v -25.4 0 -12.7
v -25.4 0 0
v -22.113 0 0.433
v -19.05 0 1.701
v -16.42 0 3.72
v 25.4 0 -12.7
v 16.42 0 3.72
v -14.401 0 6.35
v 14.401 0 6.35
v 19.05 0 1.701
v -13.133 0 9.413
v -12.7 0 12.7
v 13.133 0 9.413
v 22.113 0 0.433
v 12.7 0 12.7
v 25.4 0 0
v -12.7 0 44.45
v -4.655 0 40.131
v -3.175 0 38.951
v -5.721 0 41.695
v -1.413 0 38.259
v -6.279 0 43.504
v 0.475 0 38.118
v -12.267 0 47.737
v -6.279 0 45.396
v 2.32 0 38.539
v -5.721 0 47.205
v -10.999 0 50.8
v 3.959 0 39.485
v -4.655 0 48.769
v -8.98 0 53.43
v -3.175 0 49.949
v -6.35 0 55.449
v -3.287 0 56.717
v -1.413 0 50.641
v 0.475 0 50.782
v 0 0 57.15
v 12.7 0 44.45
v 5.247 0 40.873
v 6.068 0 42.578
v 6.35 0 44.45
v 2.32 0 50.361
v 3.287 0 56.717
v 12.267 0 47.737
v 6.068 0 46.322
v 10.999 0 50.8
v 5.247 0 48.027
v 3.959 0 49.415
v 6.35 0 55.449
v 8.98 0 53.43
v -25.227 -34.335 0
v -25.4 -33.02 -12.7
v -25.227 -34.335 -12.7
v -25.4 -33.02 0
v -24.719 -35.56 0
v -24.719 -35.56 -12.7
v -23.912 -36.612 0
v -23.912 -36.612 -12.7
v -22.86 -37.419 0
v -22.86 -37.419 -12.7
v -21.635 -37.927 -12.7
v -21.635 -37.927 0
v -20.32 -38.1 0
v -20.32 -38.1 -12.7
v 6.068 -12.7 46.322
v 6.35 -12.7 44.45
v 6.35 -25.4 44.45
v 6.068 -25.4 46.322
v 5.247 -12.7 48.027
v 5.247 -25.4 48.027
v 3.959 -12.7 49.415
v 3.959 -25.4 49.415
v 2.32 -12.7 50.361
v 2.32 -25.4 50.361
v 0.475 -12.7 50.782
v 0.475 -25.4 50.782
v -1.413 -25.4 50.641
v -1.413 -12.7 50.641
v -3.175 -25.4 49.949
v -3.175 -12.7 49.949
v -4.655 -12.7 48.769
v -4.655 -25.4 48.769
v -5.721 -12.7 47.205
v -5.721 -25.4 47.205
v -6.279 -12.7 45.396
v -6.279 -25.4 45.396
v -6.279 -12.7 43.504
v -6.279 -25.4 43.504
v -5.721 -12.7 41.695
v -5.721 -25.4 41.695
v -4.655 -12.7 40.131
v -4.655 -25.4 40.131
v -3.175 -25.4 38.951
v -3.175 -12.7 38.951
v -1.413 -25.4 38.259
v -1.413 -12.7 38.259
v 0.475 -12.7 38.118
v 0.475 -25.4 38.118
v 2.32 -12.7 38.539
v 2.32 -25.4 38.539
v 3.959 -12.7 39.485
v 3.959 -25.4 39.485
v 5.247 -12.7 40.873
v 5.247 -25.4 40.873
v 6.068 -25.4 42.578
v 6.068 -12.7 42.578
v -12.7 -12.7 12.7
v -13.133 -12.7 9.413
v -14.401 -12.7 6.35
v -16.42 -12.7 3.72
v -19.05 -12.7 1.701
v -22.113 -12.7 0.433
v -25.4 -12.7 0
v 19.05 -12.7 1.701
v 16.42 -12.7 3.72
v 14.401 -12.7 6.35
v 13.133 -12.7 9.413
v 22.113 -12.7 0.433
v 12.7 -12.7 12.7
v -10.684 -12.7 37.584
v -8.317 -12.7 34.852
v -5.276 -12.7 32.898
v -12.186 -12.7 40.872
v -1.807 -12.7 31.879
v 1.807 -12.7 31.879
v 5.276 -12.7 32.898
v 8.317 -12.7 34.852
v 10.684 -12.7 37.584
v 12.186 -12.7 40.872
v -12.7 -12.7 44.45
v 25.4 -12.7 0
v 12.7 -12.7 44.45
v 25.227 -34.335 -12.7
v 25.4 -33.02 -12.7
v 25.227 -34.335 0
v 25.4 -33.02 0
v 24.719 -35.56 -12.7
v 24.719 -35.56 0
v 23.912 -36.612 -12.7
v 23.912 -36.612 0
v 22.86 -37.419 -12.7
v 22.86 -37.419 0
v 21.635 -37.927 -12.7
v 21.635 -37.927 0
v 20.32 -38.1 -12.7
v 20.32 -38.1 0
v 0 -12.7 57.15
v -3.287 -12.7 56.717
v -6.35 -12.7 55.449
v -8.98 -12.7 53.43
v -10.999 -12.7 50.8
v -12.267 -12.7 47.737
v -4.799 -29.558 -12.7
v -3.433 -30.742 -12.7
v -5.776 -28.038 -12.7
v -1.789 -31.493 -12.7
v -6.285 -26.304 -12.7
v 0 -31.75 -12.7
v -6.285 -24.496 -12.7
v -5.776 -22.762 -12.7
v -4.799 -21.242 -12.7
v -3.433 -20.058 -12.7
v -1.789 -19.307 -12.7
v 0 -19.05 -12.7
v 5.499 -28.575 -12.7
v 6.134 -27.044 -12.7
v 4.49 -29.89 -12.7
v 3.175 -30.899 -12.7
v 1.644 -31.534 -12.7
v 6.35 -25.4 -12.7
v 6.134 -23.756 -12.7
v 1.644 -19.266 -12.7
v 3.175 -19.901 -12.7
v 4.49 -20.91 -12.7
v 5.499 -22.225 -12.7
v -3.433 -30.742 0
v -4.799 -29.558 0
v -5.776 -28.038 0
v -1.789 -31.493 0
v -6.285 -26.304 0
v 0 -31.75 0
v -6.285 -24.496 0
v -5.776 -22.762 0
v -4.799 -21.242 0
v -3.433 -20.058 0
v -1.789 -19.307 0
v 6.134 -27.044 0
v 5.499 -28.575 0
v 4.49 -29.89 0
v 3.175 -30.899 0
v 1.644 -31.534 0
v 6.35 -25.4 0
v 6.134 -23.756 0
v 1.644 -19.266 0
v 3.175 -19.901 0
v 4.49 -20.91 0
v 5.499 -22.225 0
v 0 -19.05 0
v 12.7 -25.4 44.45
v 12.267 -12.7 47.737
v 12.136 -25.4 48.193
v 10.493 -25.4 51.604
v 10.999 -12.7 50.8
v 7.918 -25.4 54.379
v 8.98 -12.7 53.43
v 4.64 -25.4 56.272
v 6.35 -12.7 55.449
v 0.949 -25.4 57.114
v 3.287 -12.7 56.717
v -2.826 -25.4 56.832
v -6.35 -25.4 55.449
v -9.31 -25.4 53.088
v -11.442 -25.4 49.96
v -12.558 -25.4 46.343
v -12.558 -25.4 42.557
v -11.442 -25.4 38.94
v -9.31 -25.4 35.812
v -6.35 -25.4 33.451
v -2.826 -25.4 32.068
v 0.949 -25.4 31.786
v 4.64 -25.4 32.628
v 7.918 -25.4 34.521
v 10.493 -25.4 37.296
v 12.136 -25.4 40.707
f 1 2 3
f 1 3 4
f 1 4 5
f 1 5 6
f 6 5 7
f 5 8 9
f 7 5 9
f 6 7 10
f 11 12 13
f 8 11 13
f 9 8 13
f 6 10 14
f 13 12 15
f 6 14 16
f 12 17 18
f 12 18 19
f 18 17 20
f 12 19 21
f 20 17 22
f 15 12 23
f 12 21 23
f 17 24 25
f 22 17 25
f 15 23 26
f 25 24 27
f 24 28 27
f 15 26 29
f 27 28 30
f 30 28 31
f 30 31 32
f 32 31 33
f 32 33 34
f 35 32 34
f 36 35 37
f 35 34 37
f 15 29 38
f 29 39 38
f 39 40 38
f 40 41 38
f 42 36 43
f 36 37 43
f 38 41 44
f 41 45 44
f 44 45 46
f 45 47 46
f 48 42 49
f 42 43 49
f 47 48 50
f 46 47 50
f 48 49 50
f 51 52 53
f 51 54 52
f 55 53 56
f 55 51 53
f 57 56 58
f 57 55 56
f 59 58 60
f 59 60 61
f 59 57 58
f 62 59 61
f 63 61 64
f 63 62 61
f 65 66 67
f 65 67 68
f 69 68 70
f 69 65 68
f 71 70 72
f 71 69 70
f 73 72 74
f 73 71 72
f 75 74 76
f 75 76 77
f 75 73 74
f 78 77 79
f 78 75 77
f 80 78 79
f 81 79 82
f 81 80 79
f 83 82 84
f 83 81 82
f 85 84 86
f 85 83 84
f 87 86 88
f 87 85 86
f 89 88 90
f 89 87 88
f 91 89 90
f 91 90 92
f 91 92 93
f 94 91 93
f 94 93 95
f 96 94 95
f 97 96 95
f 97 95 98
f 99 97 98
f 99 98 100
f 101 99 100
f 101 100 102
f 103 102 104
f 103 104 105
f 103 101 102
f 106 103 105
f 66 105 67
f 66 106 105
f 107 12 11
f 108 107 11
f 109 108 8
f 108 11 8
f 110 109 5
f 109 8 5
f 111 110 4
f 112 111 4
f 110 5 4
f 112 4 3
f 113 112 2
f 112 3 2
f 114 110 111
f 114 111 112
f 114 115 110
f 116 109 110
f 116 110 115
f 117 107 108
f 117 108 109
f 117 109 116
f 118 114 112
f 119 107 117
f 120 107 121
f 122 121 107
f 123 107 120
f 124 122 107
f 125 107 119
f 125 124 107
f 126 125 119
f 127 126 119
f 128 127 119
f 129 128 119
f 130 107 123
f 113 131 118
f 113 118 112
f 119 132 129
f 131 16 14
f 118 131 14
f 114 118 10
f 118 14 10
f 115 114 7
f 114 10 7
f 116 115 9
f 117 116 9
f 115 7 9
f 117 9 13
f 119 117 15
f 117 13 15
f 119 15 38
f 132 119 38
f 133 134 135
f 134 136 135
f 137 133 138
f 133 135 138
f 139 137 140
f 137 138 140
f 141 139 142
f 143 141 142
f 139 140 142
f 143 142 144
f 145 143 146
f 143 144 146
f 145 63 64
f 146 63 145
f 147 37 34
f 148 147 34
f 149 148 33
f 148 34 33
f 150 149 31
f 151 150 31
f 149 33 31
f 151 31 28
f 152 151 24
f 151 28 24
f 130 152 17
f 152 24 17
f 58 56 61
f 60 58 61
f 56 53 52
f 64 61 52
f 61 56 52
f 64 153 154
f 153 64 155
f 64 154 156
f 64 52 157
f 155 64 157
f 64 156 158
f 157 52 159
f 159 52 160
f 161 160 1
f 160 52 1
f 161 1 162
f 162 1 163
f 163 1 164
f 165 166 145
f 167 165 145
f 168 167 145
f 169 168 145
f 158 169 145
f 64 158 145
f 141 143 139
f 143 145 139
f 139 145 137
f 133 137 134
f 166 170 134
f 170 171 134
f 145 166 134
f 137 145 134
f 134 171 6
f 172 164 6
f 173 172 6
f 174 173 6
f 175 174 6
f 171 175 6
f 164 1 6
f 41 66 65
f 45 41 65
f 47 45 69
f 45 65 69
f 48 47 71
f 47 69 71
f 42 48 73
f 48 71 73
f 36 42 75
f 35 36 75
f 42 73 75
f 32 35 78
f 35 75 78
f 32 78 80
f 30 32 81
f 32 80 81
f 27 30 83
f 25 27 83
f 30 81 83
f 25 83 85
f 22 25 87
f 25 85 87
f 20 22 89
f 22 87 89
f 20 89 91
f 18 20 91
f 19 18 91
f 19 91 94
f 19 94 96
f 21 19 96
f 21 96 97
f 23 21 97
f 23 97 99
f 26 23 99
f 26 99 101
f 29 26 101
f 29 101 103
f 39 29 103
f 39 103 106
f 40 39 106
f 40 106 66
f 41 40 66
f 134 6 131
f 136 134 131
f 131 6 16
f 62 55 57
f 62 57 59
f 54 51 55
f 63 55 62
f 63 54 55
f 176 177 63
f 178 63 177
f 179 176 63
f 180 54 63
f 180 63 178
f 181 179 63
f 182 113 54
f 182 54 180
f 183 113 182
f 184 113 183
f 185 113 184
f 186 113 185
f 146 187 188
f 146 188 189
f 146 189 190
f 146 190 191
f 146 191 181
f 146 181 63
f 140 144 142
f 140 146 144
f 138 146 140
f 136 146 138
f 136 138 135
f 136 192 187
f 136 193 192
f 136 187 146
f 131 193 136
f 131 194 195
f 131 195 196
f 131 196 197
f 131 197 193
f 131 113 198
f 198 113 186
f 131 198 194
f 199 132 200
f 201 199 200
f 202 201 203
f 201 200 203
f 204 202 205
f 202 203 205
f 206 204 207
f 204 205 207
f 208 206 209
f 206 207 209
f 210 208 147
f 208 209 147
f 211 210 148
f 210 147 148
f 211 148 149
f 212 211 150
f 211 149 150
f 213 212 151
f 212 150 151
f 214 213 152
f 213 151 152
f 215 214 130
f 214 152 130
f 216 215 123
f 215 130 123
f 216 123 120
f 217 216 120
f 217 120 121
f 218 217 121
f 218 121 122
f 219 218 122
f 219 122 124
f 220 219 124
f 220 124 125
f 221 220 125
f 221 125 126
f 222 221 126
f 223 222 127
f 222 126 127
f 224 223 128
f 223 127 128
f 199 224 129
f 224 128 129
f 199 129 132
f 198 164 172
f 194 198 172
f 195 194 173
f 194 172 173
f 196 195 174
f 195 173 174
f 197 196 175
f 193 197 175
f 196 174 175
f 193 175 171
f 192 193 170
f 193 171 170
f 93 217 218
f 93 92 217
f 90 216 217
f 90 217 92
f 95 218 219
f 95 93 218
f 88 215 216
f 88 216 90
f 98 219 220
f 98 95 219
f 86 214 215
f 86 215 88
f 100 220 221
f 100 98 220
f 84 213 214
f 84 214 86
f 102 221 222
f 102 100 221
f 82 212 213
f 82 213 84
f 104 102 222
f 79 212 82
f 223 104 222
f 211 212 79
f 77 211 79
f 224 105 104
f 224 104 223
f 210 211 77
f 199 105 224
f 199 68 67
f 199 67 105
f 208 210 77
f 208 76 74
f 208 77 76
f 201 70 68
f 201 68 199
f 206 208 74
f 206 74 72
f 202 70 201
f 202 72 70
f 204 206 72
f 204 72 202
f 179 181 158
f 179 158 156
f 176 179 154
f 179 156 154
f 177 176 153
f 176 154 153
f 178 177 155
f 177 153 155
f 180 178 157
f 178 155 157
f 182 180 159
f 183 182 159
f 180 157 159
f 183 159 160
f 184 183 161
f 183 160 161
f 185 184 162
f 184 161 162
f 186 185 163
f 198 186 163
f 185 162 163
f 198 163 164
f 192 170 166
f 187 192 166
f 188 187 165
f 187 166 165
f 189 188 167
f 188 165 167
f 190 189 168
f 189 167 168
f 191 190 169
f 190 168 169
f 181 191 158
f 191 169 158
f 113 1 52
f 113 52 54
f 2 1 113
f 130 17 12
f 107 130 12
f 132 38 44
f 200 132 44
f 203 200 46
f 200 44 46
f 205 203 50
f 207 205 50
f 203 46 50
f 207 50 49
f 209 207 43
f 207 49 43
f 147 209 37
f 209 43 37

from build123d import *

# Parameters (mm, degrees)
F0_W      = 12.7
F0_H      = 12.7
F1_DEPTH  = 12.7
F3_DEPTH  = 25.4
F4_W      = 50.8
F4_H      = 12.7
F5_DEPTH  = 25.4
F6_R      = 5.08
F7_R      = 12.7
F7_R_2    = 6.35
F8_DEPTH  = 12.7
F9_DEPTH  = 25.4
F11_DEPTH = 25.4


with BuildPart() as f1:
    # F0 (on Front) → F1 (new body)
    with BuildSketch(Plane.XZ):
        with BuildLine():
            Line((0, 31.75), (0, 0))
            Line((0, 0), (12.7, 0))
            Line((12.7, 0), (12.7, 12.7))
            Line((12.7, 12.7), (12.7, 44.45))
            ThreePointArc((12.7, 44.45), (8.9802561211, 35.4697438789), (0, 31.75))
        make_face()
        Polygon((12.7, 0), (0, 0), (-12.7, 0), (-25.4, 0), (-25.4, -12.7), (0, -12.7), (25.4, -12.7), (25.4, 0), align=None)
        with BuildLine():
            Line((-12.7, 0), (0, 0))
            Line((0, 0), (0, 31.75))
            ThreePointArc((0, 31.75), (-8.9802561211, 35.4697438789), (-12.7, 44.45))
            Line((-12.7, 44.45), (-12.7, 12.7))
            Line((-12.7, 12.7), (-12.7, 0))
        make_face()
        with Locations((19.05, 6.35)):
            Rectangle(F0_W, F0_H)
        with Locations((-19.05, 6.35)):
            Rectangle(F0_W, F0_H)
        with BuildLine():
            ThreePointArc((-12.7, 44.45), (-8.9802561211, 35.4697438789), (0, 31.75))
            Line((0, 31.75), (0, 44.45))
            Line((0, 44.45), (-12.7, 44.45))
        make_face()
        with BuildLine():
            Line((0, 44.45), (0, 31.75))
            ThreePointArc((0, 31.75), (8.9802561211, 35.4697438789), (12.7, 44.45))
            Line((12.7, 44.45), (0, 44.45))
        make_face()
        with BuildLine():
            Line((-12.7, 44.45), (0, 44.45))
            Line((0, 44.45), (0, 57.15))
            ThreePointArc((0, 57.15), (-8.9802561211, 53.4302561211), (-12.7, 44.45))
        make_face()
        with BuildLine():
            Line((0, 57.15), (0, 44.45))
            Line((0, 44.45), (12.7, 44.45))
            ThreePointArc((12.7, 44.45), (8.9802561211, 53.4302561211), (0, 57.15))
        make_face()
    extrude(amount=F1_DEPTH)

    # F2 (on face) → F3 (cut)
    with BuildSketch(Plane(origin=(0, 0, 0), x_dir=(-1, 0, 0), z_dir=(0, 1, 0))):
        with BuildLine():
            Line((25.4, 12.7), (12.7, 12.7))
            ThreePointArc((12.7, 12.7), (16.4197438789, 3.7197438789), (25.4, 0))
            Line((25.4, 0), (25.4, 12.7))
        make_face()
        with BuildLine():
            ThreePointArc((-25.4, 0), (-16.4197438789, 3.7197438789), (-12.7, 12.7))
            Line((-12.7, 12.7), (-25.4, 12.7))
            Line((-25.4, 12.7), (-25.4, 0))
        make_face()
    extrude(amount=-F3_DEPTH, mode=Mode.SUBTRACT)

    # F4 (on face) → F5 (join)
    with BuildSketch(Plane.XZ.offset(12.7)):
        with Locations((0, -6.35)):
            Rectangle(F4_W, F4_H)
    extrude(amount=F5_DEPTH)

    # F6
    f6_edges = [f1.edges().sort_by_distance(p)[0] for p in [
        (25.4, -38.1, -6.35),
        (-25.4, -38.1, -6.35),
    ]]
    fillet(f6_edges, radius=F6_R)

    # F7 (on face) → F8 (join)
    with BuildSketch(Plane.XZ.offset(12.7)):
        with Locations((0, 44.45)):
            Circle(F7_R)
        with Locations((0, 44.45)):
            Circle(F7_R_2, mode=Mode.SUBTRACT)
    extrude(amount=F8_DEPTH)

    # F9 (cut): a face of the model
    f9_faces = [f1.faces().sort_by_distance(p)[0] for p in [
        (0, -12.7, 44.45),
    ]]
    extrude(f9_faces, amount=-F9_DEPTH, mode=Mode.SUBTRACT)

    # F10 (on face) → F11 (cut)
    with BuildSketch(Plane(origin=(0, 0, -12.7), x_dir=(1, 0, 0), z_dir=(0, 0, -1))):
        with BuildLine():
            ThreePointArc((0, 31.75), (-6.35, 25.4), (0, 19.05))
            Line((0, 19.05), (0, 25.4))
            Line((0, 25.4), (0, 31.75))
        make_face()
        with BuildLine():
            Line((0, 25.4), (0, 19.05))
            ThreePointArc((0, 19.05), (4.4901280605, 20.9098719395), (6.35, 25.4))
            ThreePointArc((6.35, 25.4), (4.4901280605, 29.8901280605), (0, 31.75))
            Line((0, 31.75), (0, 25.4))
        make_face()
    extrude(amount=-F11_DEPTH, mode=Mode.SUBTRACT)


solid = f1.part
